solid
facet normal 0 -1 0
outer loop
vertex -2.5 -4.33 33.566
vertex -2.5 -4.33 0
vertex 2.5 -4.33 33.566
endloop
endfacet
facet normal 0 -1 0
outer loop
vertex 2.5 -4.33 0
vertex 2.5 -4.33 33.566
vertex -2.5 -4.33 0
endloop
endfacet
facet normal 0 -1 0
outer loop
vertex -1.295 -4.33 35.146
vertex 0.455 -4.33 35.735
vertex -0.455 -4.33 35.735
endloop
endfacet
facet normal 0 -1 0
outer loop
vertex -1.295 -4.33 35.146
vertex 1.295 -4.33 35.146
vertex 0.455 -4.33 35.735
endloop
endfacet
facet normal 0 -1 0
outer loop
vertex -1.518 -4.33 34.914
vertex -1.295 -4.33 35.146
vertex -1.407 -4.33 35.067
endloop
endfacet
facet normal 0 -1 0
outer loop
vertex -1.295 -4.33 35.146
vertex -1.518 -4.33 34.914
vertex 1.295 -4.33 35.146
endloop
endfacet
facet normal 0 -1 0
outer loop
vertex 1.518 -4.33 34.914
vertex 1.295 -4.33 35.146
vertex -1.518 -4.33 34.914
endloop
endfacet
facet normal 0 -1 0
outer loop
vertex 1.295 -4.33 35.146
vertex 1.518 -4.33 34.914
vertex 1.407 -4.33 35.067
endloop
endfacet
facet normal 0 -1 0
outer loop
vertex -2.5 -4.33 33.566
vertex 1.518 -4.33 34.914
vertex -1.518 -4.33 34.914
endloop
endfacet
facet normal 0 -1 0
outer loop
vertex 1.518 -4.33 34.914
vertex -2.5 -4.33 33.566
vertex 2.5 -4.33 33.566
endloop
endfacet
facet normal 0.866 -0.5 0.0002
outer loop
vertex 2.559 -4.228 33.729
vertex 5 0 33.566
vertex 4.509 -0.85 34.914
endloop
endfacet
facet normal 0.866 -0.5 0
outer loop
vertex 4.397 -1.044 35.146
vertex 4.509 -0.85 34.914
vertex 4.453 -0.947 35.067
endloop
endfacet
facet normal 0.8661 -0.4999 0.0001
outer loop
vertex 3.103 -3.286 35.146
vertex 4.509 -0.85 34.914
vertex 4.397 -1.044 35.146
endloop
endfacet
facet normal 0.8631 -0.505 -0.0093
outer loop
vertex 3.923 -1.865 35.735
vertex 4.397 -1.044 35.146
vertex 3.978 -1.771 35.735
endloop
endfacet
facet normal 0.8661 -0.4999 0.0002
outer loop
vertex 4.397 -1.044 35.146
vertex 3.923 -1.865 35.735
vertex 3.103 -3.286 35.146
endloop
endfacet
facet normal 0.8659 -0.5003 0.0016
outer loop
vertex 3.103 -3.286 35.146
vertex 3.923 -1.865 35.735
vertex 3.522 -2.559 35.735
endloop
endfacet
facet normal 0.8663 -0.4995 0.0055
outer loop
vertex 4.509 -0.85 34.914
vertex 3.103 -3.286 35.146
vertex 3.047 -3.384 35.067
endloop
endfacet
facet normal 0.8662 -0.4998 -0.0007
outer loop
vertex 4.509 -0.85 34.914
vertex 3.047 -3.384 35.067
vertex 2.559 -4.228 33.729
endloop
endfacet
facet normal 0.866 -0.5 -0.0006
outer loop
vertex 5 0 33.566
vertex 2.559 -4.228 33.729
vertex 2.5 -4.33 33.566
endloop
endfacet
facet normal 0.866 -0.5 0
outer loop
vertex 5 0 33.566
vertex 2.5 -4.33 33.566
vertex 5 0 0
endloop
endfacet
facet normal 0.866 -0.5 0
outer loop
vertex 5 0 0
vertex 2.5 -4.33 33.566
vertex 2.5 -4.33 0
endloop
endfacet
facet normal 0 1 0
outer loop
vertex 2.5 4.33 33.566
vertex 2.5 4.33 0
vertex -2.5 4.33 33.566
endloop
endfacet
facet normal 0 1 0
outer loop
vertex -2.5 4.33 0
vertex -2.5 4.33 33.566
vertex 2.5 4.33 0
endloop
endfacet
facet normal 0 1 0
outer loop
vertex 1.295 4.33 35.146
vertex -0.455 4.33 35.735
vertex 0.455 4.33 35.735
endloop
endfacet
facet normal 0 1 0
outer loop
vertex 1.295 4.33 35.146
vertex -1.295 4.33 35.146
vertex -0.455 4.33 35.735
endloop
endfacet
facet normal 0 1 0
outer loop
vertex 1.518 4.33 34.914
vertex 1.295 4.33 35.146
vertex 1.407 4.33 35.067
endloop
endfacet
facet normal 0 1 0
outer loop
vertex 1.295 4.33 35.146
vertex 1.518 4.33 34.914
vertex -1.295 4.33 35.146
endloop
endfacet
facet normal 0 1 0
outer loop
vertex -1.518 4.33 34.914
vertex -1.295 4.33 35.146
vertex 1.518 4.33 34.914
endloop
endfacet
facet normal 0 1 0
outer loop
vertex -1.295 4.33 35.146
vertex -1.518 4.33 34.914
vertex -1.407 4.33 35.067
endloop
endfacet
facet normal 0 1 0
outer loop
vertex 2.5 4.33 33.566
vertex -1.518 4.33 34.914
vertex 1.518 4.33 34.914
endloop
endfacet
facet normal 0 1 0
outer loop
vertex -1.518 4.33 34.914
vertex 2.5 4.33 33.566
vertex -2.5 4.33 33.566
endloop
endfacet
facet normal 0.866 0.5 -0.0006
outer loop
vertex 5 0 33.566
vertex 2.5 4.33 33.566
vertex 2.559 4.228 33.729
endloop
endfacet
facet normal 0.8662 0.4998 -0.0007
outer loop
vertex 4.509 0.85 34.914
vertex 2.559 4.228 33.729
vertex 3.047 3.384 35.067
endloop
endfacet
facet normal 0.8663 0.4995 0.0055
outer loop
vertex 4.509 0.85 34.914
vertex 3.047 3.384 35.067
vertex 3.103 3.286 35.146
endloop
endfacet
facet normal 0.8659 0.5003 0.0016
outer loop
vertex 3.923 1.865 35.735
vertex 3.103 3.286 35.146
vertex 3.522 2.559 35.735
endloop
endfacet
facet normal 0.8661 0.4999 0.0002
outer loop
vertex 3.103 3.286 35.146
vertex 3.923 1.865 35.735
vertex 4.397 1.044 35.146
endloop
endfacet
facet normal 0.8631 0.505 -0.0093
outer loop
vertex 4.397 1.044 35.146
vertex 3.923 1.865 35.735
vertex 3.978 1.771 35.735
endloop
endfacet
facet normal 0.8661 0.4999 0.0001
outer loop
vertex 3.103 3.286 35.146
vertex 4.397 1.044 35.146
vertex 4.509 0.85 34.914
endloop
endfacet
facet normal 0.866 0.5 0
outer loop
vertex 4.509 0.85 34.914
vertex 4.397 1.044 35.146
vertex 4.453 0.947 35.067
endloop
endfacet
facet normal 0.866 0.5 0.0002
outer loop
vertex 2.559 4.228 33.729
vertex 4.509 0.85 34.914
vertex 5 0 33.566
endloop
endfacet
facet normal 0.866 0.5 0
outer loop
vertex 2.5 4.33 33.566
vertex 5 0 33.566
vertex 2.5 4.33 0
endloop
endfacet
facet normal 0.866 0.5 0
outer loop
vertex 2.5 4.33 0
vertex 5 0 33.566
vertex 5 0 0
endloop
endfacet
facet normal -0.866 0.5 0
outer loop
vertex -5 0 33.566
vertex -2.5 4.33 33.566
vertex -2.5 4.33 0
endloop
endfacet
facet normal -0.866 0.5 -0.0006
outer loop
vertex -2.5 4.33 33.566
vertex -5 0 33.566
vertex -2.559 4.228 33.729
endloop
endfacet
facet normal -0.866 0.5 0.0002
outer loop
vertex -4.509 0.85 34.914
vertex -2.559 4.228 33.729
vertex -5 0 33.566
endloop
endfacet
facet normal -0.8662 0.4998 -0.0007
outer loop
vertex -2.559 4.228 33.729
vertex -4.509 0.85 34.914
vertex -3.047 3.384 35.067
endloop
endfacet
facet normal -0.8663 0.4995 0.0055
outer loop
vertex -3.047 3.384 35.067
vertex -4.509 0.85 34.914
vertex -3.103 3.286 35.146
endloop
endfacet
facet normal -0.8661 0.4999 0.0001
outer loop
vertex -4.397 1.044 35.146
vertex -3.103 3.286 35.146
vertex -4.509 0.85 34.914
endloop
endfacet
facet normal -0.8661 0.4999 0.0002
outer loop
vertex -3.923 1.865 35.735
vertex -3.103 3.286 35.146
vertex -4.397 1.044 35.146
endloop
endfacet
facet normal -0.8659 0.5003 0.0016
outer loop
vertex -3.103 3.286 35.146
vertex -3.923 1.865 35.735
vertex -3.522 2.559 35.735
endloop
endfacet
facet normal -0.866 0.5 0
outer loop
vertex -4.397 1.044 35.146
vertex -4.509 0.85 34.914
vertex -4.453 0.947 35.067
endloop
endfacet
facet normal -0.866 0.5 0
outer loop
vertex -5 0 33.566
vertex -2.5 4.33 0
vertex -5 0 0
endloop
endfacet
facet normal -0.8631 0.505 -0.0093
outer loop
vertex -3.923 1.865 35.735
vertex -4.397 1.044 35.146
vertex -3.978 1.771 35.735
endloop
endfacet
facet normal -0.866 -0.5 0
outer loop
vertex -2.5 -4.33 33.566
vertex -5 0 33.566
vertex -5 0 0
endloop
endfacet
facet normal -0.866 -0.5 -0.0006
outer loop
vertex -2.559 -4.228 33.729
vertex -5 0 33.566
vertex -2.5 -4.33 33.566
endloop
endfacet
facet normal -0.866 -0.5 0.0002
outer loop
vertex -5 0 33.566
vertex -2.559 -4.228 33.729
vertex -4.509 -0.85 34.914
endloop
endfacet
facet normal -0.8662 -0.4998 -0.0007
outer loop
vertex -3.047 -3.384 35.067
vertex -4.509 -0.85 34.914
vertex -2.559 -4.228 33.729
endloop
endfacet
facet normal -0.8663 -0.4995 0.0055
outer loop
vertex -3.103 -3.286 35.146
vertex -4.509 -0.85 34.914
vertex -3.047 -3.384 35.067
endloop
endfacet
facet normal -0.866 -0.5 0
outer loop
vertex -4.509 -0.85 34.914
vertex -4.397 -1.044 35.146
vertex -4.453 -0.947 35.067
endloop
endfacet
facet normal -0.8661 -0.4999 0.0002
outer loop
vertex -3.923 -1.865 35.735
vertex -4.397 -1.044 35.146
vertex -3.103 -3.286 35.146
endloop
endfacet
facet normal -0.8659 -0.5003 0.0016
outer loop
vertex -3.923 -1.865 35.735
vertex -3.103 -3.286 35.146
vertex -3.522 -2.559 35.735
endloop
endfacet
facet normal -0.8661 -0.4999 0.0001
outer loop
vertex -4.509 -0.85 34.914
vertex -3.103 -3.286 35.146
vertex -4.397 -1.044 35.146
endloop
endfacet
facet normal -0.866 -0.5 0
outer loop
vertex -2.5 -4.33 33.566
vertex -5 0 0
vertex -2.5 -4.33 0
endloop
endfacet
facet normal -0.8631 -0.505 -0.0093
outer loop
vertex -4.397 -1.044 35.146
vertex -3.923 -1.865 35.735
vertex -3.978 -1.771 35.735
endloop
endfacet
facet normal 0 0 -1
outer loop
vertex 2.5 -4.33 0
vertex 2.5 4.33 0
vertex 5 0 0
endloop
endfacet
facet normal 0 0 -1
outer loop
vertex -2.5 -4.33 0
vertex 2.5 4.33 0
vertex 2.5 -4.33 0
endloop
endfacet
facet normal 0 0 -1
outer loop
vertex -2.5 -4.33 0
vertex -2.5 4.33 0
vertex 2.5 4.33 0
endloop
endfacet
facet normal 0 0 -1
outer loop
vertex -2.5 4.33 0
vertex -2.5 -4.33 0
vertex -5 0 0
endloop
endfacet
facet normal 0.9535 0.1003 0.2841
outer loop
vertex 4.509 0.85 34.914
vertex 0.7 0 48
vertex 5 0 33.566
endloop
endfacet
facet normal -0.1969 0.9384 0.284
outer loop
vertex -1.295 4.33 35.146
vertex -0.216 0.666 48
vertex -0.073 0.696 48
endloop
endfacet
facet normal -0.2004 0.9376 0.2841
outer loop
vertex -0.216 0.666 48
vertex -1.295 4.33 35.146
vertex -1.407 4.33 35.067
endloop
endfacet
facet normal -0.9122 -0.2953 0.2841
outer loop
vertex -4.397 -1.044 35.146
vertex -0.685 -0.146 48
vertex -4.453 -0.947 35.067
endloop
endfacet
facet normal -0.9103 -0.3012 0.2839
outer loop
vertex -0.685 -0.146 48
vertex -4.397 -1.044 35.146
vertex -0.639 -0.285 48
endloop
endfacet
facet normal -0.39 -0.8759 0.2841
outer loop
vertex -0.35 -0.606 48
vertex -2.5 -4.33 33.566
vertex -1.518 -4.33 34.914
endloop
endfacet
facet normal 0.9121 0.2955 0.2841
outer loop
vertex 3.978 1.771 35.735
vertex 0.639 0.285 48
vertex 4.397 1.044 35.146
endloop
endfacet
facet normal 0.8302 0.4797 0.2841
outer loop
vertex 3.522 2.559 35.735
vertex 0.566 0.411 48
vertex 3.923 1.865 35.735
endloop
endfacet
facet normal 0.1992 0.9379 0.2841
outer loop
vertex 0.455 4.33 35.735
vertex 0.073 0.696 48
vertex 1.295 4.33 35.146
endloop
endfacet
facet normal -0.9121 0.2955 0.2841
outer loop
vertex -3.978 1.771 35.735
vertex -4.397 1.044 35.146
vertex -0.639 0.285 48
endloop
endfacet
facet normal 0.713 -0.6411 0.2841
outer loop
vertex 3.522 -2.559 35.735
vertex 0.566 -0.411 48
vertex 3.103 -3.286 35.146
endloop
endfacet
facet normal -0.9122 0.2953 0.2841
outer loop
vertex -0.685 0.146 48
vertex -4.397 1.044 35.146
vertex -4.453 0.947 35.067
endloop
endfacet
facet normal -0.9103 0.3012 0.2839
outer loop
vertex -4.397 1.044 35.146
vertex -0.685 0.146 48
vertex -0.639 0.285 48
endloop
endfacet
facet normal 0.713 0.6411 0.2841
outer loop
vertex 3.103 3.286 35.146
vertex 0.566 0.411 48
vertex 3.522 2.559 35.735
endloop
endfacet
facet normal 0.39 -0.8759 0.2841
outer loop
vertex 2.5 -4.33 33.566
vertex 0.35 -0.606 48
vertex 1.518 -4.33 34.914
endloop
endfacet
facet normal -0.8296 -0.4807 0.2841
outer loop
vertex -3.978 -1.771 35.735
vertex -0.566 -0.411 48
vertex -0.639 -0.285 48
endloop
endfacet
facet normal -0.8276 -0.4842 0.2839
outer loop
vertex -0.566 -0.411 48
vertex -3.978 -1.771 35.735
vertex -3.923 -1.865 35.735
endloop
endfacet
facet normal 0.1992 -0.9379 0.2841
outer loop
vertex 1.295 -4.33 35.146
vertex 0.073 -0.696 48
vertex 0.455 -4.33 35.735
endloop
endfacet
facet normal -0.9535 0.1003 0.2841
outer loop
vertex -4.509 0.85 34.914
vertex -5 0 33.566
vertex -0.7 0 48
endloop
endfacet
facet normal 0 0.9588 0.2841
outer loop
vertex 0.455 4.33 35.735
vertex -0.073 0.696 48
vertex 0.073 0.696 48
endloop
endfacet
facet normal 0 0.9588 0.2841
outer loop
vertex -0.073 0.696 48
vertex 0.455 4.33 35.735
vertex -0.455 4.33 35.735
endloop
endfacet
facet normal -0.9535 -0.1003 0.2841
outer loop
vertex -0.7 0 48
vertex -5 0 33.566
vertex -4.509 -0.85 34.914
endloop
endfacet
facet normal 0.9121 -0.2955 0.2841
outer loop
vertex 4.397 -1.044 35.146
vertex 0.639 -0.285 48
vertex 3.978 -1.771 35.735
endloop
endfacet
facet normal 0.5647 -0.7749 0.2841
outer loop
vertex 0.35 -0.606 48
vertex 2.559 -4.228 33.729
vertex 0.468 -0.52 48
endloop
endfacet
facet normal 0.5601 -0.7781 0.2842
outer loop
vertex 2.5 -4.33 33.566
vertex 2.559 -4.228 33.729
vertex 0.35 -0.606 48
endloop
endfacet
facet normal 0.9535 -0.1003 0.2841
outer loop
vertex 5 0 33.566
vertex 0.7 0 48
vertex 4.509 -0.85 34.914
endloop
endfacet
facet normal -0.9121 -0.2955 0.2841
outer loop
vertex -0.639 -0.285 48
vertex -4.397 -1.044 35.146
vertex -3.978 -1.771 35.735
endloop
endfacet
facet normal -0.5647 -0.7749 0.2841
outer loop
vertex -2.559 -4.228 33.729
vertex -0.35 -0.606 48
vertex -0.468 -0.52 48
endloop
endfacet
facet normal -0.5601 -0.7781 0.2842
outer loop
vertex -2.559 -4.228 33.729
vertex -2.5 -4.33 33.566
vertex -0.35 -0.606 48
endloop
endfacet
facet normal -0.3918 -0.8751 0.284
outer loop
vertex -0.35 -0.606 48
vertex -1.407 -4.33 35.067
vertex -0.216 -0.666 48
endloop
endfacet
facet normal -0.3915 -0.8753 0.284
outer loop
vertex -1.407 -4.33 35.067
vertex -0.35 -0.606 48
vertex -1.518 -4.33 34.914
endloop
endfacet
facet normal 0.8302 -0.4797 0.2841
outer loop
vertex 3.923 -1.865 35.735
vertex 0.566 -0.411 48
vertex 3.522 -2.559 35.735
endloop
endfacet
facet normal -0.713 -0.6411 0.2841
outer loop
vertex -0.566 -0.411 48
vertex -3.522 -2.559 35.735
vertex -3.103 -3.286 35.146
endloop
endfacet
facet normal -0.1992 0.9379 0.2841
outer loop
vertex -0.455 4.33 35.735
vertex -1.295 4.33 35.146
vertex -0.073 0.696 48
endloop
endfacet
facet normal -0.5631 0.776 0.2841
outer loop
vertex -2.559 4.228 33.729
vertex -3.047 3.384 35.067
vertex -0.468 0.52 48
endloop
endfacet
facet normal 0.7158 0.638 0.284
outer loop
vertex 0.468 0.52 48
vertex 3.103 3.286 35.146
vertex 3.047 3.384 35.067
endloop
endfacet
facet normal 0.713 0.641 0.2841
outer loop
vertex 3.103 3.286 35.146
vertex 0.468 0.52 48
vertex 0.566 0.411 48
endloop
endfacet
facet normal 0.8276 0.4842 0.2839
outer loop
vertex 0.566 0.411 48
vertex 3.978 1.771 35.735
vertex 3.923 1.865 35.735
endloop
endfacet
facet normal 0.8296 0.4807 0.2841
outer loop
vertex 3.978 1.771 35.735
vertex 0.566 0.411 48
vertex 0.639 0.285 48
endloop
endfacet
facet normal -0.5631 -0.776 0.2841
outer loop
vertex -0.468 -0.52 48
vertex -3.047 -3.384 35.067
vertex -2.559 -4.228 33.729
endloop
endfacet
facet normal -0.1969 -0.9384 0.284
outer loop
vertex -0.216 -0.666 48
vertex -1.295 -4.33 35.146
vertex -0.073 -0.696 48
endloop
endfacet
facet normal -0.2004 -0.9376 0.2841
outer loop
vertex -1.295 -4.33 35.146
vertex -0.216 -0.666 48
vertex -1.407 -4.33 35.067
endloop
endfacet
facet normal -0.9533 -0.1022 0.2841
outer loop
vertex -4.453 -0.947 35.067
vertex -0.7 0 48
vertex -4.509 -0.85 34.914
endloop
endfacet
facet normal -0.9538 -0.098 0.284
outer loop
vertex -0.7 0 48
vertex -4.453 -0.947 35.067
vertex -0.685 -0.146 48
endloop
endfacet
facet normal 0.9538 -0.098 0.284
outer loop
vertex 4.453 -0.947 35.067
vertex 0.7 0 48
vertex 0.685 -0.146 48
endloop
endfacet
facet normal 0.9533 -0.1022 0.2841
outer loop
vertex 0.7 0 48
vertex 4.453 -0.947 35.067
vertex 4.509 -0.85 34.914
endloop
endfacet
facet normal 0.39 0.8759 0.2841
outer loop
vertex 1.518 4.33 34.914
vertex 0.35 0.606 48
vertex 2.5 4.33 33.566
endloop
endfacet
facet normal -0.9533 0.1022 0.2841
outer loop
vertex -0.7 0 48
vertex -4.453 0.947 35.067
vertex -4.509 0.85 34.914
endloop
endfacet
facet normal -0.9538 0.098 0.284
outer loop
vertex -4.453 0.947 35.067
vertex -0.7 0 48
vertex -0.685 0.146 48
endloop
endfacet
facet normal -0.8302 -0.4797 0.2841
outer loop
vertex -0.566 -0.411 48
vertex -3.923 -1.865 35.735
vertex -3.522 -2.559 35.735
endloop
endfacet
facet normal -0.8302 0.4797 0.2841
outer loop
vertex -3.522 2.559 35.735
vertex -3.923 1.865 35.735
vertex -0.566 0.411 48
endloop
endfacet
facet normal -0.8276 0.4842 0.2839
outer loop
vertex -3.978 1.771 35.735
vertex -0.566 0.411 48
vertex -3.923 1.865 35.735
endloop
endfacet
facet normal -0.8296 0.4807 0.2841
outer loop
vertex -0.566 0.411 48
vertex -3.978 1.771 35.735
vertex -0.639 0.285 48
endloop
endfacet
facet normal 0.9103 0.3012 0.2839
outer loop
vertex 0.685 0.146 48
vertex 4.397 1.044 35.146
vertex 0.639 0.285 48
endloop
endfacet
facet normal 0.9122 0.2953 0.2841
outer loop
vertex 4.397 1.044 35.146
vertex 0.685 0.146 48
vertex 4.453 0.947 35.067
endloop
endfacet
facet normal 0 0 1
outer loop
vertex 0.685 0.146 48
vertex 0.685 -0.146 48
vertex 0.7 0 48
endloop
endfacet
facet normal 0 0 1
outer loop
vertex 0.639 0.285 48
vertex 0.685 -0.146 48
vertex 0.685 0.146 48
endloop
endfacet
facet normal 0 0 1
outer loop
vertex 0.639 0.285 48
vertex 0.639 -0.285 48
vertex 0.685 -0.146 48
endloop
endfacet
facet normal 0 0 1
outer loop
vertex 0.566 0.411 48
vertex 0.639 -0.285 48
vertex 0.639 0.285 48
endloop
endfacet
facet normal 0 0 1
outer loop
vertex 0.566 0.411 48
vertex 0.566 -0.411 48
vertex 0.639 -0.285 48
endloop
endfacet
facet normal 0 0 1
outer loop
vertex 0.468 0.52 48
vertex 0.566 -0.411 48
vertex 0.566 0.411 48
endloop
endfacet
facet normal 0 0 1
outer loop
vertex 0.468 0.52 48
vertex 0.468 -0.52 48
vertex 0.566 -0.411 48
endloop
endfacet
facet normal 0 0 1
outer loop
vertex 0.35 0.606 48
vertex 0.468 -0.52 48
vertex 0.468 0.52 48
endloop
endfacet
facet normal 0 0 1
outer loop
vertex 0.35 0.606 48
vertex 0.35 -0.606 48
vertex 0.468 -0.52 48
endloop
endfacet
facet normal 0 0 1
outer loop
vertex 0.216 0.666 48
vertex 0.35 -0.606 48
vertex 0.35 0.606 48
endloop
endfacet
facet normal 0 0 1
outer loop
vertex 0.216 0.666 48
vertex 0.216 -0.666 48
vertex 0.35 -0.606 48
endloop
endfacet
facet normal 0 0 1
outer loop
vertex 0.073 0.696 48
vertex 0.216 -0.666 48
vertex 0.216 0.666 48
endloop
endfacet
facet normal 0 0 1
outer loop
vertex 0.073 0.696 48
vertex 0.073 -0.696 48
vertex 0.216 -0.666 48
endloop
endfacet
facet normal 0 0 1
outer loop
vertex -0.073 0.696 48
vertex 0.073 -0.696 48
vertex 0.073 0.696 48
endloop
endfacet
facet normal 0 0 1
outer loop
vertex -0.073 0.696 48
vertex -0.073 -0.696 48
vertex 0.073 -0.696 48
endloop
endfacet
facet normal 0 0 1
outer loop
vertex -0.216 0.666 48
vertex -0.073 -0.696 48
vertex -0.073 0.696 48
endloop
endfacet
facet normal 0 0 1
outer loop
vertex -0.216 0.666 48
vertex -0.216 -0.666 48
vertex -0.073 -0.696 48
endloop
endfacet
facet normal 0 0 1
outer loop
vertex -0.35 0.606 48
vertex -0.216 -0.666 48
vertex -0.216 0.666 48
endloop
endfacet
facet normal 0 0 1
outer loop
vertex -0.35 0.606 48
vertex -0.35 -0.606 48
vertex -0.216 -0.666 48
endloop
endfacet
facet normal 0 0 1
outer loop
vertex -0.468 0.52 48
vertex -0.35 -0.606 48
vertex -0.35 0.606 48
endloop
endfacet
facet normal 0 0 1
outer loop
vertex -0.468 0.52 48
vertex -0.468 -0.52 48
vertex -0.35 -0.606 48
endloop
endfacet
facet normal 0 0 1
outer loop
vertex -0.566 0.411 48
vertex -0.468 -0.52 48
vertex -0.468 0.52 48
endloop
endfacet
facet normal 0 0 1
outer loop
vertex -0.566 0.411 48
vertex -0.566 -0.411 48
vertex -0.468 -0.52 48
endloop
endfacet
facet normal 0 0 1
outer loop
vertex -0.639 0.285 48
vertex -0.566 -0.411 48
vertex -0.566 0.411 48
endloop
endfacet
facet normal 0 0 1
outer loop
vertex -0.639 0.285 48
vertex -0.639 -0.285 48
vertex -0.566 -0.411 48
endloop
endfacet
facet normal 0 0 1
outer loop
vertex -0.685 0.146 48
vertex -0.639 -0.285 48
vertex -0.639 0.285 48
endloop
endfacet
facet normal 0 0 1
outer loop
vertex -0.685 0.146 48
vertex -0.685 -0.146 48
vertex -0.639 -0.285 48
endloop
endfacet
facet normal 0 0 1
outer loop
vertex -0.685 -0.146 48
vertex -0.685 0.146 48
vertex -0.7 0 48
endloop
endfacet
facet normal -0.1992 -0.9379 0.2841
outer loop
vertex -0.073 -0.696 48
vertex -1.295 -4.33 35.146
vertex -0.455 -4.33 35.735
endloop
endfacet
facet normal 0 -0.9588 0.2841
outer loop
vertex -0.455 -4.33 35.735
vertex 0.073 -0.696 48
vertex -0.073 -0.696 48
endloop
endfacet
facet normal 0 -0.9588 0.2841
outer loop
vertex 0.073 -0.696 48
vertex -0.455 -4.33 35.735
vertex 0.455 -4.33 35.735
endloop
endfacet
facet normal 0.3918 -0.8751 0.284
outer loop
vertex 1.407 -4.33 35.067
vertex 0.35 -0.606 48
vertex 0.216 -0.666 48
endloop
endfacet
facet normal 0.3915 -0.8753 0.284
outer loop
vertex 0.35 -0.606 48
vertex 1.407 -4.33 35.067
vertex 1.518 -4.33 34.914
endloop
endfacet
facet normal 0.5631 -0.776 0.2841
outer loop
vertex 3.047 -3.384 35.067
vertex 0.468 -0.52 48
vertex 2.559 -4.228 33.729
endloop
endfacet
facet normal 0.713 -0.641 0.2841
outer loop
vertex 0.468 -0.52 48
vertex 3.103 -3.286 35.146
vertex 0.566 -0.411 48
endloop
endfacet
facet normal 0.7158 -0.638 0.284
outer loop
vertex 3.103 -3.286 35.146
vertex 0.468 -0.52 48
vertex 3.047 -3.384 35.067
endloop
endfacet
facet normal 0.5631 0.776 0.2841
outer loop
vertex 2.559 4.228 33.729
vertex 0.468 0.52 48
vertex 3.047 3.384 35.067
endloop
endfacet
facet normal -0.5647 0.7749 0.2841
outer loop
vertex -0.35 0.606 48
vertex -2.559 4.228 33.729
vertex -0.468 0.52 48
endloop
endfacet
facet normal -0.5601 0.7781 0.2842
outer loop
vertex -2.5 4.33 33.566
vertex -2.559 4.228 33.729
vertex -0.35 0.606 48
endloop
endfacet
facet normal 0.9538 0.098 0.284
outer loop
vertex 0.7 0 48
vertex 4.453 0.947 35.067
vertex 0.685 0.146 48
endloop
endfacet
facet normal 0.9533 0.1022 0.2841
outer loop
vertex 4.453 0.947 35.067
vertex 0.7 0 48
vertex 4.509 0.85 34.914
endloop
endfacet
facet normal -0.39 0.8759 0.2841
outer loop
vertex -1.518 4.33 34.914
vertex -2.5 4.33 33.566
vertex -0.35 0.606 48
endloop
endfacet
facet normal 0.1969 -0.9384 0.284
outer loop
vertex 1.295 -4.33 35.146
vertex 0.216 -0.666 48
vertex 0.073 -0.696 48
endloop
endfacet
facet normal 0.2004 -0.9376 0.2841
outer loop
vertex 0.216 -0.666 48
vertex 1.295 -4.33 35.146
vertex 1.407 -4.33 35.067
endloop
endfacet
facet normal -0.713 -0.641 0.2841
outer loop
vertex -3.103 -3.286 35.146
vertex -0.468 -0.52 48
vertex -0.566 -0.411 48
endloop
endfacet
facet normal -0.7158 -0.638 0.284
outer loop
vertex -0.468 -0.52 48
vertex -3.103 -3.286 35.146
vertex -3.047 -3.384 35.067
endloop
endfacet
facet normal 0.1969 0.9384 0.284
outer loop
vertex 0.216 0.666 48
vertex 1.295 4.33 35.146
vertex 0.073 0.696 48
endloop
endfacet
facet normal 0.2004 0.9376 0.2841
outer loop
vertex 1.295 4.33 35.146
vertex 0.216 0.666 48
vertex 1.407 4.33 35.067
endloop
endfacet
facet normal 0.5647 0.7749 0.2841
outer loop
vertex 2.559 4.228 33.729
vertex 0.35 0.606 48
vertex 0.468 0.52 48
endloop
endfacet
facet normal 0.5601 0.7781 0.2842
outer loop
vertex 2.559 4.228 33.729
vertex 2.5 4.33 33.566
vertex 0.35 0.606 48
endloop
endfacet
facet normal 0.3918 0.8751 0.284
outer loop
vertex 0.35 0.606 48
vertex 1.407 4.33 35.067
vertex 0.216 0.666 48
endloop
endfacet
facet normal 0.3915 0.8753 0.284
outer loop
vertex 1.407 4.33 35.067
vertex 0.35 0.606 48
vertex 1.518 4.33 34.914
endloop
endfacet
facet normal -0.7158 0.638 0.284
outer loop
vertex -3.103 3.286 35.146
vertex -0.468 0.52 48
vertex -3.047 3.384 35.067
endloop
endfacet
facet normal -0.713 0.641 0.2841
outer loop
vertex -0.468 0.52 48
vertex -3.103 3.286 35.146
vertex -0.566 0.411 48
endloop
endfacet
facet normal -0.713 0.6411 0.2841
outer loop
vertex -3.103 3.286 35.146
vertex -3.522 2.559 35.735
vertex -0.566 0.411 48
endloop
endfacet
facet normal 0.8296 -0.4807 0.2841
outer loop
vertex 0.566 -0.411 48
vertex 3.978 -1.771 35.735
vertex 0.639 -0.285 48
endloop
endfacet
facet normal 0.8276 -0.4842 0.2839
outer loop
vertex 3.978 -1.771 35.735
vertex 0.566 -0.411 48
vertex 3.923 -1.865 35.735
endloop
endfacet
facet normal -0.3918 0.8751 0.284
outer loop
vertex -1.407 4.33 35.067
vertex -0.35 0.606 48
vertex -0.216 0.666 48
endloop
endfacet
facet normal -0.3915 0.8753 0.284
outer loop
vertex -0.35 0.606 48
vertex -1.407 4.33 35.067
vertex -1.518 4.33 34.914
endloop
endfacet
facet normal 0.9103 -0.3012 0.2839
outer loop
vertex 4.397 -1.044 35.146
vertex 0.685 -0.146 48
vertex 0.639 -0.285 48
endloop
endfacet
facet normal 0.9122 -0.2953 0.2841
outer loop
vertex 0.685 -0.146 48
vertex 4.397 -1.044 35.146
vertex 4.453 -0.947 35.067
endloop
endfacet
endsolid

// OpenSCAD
//6角柱と円錐の交差
intersection(){
    cylinder(r=5,h=50,$fn=6);
    cylinder(r1=15,r2=0.7,h=48);
}
